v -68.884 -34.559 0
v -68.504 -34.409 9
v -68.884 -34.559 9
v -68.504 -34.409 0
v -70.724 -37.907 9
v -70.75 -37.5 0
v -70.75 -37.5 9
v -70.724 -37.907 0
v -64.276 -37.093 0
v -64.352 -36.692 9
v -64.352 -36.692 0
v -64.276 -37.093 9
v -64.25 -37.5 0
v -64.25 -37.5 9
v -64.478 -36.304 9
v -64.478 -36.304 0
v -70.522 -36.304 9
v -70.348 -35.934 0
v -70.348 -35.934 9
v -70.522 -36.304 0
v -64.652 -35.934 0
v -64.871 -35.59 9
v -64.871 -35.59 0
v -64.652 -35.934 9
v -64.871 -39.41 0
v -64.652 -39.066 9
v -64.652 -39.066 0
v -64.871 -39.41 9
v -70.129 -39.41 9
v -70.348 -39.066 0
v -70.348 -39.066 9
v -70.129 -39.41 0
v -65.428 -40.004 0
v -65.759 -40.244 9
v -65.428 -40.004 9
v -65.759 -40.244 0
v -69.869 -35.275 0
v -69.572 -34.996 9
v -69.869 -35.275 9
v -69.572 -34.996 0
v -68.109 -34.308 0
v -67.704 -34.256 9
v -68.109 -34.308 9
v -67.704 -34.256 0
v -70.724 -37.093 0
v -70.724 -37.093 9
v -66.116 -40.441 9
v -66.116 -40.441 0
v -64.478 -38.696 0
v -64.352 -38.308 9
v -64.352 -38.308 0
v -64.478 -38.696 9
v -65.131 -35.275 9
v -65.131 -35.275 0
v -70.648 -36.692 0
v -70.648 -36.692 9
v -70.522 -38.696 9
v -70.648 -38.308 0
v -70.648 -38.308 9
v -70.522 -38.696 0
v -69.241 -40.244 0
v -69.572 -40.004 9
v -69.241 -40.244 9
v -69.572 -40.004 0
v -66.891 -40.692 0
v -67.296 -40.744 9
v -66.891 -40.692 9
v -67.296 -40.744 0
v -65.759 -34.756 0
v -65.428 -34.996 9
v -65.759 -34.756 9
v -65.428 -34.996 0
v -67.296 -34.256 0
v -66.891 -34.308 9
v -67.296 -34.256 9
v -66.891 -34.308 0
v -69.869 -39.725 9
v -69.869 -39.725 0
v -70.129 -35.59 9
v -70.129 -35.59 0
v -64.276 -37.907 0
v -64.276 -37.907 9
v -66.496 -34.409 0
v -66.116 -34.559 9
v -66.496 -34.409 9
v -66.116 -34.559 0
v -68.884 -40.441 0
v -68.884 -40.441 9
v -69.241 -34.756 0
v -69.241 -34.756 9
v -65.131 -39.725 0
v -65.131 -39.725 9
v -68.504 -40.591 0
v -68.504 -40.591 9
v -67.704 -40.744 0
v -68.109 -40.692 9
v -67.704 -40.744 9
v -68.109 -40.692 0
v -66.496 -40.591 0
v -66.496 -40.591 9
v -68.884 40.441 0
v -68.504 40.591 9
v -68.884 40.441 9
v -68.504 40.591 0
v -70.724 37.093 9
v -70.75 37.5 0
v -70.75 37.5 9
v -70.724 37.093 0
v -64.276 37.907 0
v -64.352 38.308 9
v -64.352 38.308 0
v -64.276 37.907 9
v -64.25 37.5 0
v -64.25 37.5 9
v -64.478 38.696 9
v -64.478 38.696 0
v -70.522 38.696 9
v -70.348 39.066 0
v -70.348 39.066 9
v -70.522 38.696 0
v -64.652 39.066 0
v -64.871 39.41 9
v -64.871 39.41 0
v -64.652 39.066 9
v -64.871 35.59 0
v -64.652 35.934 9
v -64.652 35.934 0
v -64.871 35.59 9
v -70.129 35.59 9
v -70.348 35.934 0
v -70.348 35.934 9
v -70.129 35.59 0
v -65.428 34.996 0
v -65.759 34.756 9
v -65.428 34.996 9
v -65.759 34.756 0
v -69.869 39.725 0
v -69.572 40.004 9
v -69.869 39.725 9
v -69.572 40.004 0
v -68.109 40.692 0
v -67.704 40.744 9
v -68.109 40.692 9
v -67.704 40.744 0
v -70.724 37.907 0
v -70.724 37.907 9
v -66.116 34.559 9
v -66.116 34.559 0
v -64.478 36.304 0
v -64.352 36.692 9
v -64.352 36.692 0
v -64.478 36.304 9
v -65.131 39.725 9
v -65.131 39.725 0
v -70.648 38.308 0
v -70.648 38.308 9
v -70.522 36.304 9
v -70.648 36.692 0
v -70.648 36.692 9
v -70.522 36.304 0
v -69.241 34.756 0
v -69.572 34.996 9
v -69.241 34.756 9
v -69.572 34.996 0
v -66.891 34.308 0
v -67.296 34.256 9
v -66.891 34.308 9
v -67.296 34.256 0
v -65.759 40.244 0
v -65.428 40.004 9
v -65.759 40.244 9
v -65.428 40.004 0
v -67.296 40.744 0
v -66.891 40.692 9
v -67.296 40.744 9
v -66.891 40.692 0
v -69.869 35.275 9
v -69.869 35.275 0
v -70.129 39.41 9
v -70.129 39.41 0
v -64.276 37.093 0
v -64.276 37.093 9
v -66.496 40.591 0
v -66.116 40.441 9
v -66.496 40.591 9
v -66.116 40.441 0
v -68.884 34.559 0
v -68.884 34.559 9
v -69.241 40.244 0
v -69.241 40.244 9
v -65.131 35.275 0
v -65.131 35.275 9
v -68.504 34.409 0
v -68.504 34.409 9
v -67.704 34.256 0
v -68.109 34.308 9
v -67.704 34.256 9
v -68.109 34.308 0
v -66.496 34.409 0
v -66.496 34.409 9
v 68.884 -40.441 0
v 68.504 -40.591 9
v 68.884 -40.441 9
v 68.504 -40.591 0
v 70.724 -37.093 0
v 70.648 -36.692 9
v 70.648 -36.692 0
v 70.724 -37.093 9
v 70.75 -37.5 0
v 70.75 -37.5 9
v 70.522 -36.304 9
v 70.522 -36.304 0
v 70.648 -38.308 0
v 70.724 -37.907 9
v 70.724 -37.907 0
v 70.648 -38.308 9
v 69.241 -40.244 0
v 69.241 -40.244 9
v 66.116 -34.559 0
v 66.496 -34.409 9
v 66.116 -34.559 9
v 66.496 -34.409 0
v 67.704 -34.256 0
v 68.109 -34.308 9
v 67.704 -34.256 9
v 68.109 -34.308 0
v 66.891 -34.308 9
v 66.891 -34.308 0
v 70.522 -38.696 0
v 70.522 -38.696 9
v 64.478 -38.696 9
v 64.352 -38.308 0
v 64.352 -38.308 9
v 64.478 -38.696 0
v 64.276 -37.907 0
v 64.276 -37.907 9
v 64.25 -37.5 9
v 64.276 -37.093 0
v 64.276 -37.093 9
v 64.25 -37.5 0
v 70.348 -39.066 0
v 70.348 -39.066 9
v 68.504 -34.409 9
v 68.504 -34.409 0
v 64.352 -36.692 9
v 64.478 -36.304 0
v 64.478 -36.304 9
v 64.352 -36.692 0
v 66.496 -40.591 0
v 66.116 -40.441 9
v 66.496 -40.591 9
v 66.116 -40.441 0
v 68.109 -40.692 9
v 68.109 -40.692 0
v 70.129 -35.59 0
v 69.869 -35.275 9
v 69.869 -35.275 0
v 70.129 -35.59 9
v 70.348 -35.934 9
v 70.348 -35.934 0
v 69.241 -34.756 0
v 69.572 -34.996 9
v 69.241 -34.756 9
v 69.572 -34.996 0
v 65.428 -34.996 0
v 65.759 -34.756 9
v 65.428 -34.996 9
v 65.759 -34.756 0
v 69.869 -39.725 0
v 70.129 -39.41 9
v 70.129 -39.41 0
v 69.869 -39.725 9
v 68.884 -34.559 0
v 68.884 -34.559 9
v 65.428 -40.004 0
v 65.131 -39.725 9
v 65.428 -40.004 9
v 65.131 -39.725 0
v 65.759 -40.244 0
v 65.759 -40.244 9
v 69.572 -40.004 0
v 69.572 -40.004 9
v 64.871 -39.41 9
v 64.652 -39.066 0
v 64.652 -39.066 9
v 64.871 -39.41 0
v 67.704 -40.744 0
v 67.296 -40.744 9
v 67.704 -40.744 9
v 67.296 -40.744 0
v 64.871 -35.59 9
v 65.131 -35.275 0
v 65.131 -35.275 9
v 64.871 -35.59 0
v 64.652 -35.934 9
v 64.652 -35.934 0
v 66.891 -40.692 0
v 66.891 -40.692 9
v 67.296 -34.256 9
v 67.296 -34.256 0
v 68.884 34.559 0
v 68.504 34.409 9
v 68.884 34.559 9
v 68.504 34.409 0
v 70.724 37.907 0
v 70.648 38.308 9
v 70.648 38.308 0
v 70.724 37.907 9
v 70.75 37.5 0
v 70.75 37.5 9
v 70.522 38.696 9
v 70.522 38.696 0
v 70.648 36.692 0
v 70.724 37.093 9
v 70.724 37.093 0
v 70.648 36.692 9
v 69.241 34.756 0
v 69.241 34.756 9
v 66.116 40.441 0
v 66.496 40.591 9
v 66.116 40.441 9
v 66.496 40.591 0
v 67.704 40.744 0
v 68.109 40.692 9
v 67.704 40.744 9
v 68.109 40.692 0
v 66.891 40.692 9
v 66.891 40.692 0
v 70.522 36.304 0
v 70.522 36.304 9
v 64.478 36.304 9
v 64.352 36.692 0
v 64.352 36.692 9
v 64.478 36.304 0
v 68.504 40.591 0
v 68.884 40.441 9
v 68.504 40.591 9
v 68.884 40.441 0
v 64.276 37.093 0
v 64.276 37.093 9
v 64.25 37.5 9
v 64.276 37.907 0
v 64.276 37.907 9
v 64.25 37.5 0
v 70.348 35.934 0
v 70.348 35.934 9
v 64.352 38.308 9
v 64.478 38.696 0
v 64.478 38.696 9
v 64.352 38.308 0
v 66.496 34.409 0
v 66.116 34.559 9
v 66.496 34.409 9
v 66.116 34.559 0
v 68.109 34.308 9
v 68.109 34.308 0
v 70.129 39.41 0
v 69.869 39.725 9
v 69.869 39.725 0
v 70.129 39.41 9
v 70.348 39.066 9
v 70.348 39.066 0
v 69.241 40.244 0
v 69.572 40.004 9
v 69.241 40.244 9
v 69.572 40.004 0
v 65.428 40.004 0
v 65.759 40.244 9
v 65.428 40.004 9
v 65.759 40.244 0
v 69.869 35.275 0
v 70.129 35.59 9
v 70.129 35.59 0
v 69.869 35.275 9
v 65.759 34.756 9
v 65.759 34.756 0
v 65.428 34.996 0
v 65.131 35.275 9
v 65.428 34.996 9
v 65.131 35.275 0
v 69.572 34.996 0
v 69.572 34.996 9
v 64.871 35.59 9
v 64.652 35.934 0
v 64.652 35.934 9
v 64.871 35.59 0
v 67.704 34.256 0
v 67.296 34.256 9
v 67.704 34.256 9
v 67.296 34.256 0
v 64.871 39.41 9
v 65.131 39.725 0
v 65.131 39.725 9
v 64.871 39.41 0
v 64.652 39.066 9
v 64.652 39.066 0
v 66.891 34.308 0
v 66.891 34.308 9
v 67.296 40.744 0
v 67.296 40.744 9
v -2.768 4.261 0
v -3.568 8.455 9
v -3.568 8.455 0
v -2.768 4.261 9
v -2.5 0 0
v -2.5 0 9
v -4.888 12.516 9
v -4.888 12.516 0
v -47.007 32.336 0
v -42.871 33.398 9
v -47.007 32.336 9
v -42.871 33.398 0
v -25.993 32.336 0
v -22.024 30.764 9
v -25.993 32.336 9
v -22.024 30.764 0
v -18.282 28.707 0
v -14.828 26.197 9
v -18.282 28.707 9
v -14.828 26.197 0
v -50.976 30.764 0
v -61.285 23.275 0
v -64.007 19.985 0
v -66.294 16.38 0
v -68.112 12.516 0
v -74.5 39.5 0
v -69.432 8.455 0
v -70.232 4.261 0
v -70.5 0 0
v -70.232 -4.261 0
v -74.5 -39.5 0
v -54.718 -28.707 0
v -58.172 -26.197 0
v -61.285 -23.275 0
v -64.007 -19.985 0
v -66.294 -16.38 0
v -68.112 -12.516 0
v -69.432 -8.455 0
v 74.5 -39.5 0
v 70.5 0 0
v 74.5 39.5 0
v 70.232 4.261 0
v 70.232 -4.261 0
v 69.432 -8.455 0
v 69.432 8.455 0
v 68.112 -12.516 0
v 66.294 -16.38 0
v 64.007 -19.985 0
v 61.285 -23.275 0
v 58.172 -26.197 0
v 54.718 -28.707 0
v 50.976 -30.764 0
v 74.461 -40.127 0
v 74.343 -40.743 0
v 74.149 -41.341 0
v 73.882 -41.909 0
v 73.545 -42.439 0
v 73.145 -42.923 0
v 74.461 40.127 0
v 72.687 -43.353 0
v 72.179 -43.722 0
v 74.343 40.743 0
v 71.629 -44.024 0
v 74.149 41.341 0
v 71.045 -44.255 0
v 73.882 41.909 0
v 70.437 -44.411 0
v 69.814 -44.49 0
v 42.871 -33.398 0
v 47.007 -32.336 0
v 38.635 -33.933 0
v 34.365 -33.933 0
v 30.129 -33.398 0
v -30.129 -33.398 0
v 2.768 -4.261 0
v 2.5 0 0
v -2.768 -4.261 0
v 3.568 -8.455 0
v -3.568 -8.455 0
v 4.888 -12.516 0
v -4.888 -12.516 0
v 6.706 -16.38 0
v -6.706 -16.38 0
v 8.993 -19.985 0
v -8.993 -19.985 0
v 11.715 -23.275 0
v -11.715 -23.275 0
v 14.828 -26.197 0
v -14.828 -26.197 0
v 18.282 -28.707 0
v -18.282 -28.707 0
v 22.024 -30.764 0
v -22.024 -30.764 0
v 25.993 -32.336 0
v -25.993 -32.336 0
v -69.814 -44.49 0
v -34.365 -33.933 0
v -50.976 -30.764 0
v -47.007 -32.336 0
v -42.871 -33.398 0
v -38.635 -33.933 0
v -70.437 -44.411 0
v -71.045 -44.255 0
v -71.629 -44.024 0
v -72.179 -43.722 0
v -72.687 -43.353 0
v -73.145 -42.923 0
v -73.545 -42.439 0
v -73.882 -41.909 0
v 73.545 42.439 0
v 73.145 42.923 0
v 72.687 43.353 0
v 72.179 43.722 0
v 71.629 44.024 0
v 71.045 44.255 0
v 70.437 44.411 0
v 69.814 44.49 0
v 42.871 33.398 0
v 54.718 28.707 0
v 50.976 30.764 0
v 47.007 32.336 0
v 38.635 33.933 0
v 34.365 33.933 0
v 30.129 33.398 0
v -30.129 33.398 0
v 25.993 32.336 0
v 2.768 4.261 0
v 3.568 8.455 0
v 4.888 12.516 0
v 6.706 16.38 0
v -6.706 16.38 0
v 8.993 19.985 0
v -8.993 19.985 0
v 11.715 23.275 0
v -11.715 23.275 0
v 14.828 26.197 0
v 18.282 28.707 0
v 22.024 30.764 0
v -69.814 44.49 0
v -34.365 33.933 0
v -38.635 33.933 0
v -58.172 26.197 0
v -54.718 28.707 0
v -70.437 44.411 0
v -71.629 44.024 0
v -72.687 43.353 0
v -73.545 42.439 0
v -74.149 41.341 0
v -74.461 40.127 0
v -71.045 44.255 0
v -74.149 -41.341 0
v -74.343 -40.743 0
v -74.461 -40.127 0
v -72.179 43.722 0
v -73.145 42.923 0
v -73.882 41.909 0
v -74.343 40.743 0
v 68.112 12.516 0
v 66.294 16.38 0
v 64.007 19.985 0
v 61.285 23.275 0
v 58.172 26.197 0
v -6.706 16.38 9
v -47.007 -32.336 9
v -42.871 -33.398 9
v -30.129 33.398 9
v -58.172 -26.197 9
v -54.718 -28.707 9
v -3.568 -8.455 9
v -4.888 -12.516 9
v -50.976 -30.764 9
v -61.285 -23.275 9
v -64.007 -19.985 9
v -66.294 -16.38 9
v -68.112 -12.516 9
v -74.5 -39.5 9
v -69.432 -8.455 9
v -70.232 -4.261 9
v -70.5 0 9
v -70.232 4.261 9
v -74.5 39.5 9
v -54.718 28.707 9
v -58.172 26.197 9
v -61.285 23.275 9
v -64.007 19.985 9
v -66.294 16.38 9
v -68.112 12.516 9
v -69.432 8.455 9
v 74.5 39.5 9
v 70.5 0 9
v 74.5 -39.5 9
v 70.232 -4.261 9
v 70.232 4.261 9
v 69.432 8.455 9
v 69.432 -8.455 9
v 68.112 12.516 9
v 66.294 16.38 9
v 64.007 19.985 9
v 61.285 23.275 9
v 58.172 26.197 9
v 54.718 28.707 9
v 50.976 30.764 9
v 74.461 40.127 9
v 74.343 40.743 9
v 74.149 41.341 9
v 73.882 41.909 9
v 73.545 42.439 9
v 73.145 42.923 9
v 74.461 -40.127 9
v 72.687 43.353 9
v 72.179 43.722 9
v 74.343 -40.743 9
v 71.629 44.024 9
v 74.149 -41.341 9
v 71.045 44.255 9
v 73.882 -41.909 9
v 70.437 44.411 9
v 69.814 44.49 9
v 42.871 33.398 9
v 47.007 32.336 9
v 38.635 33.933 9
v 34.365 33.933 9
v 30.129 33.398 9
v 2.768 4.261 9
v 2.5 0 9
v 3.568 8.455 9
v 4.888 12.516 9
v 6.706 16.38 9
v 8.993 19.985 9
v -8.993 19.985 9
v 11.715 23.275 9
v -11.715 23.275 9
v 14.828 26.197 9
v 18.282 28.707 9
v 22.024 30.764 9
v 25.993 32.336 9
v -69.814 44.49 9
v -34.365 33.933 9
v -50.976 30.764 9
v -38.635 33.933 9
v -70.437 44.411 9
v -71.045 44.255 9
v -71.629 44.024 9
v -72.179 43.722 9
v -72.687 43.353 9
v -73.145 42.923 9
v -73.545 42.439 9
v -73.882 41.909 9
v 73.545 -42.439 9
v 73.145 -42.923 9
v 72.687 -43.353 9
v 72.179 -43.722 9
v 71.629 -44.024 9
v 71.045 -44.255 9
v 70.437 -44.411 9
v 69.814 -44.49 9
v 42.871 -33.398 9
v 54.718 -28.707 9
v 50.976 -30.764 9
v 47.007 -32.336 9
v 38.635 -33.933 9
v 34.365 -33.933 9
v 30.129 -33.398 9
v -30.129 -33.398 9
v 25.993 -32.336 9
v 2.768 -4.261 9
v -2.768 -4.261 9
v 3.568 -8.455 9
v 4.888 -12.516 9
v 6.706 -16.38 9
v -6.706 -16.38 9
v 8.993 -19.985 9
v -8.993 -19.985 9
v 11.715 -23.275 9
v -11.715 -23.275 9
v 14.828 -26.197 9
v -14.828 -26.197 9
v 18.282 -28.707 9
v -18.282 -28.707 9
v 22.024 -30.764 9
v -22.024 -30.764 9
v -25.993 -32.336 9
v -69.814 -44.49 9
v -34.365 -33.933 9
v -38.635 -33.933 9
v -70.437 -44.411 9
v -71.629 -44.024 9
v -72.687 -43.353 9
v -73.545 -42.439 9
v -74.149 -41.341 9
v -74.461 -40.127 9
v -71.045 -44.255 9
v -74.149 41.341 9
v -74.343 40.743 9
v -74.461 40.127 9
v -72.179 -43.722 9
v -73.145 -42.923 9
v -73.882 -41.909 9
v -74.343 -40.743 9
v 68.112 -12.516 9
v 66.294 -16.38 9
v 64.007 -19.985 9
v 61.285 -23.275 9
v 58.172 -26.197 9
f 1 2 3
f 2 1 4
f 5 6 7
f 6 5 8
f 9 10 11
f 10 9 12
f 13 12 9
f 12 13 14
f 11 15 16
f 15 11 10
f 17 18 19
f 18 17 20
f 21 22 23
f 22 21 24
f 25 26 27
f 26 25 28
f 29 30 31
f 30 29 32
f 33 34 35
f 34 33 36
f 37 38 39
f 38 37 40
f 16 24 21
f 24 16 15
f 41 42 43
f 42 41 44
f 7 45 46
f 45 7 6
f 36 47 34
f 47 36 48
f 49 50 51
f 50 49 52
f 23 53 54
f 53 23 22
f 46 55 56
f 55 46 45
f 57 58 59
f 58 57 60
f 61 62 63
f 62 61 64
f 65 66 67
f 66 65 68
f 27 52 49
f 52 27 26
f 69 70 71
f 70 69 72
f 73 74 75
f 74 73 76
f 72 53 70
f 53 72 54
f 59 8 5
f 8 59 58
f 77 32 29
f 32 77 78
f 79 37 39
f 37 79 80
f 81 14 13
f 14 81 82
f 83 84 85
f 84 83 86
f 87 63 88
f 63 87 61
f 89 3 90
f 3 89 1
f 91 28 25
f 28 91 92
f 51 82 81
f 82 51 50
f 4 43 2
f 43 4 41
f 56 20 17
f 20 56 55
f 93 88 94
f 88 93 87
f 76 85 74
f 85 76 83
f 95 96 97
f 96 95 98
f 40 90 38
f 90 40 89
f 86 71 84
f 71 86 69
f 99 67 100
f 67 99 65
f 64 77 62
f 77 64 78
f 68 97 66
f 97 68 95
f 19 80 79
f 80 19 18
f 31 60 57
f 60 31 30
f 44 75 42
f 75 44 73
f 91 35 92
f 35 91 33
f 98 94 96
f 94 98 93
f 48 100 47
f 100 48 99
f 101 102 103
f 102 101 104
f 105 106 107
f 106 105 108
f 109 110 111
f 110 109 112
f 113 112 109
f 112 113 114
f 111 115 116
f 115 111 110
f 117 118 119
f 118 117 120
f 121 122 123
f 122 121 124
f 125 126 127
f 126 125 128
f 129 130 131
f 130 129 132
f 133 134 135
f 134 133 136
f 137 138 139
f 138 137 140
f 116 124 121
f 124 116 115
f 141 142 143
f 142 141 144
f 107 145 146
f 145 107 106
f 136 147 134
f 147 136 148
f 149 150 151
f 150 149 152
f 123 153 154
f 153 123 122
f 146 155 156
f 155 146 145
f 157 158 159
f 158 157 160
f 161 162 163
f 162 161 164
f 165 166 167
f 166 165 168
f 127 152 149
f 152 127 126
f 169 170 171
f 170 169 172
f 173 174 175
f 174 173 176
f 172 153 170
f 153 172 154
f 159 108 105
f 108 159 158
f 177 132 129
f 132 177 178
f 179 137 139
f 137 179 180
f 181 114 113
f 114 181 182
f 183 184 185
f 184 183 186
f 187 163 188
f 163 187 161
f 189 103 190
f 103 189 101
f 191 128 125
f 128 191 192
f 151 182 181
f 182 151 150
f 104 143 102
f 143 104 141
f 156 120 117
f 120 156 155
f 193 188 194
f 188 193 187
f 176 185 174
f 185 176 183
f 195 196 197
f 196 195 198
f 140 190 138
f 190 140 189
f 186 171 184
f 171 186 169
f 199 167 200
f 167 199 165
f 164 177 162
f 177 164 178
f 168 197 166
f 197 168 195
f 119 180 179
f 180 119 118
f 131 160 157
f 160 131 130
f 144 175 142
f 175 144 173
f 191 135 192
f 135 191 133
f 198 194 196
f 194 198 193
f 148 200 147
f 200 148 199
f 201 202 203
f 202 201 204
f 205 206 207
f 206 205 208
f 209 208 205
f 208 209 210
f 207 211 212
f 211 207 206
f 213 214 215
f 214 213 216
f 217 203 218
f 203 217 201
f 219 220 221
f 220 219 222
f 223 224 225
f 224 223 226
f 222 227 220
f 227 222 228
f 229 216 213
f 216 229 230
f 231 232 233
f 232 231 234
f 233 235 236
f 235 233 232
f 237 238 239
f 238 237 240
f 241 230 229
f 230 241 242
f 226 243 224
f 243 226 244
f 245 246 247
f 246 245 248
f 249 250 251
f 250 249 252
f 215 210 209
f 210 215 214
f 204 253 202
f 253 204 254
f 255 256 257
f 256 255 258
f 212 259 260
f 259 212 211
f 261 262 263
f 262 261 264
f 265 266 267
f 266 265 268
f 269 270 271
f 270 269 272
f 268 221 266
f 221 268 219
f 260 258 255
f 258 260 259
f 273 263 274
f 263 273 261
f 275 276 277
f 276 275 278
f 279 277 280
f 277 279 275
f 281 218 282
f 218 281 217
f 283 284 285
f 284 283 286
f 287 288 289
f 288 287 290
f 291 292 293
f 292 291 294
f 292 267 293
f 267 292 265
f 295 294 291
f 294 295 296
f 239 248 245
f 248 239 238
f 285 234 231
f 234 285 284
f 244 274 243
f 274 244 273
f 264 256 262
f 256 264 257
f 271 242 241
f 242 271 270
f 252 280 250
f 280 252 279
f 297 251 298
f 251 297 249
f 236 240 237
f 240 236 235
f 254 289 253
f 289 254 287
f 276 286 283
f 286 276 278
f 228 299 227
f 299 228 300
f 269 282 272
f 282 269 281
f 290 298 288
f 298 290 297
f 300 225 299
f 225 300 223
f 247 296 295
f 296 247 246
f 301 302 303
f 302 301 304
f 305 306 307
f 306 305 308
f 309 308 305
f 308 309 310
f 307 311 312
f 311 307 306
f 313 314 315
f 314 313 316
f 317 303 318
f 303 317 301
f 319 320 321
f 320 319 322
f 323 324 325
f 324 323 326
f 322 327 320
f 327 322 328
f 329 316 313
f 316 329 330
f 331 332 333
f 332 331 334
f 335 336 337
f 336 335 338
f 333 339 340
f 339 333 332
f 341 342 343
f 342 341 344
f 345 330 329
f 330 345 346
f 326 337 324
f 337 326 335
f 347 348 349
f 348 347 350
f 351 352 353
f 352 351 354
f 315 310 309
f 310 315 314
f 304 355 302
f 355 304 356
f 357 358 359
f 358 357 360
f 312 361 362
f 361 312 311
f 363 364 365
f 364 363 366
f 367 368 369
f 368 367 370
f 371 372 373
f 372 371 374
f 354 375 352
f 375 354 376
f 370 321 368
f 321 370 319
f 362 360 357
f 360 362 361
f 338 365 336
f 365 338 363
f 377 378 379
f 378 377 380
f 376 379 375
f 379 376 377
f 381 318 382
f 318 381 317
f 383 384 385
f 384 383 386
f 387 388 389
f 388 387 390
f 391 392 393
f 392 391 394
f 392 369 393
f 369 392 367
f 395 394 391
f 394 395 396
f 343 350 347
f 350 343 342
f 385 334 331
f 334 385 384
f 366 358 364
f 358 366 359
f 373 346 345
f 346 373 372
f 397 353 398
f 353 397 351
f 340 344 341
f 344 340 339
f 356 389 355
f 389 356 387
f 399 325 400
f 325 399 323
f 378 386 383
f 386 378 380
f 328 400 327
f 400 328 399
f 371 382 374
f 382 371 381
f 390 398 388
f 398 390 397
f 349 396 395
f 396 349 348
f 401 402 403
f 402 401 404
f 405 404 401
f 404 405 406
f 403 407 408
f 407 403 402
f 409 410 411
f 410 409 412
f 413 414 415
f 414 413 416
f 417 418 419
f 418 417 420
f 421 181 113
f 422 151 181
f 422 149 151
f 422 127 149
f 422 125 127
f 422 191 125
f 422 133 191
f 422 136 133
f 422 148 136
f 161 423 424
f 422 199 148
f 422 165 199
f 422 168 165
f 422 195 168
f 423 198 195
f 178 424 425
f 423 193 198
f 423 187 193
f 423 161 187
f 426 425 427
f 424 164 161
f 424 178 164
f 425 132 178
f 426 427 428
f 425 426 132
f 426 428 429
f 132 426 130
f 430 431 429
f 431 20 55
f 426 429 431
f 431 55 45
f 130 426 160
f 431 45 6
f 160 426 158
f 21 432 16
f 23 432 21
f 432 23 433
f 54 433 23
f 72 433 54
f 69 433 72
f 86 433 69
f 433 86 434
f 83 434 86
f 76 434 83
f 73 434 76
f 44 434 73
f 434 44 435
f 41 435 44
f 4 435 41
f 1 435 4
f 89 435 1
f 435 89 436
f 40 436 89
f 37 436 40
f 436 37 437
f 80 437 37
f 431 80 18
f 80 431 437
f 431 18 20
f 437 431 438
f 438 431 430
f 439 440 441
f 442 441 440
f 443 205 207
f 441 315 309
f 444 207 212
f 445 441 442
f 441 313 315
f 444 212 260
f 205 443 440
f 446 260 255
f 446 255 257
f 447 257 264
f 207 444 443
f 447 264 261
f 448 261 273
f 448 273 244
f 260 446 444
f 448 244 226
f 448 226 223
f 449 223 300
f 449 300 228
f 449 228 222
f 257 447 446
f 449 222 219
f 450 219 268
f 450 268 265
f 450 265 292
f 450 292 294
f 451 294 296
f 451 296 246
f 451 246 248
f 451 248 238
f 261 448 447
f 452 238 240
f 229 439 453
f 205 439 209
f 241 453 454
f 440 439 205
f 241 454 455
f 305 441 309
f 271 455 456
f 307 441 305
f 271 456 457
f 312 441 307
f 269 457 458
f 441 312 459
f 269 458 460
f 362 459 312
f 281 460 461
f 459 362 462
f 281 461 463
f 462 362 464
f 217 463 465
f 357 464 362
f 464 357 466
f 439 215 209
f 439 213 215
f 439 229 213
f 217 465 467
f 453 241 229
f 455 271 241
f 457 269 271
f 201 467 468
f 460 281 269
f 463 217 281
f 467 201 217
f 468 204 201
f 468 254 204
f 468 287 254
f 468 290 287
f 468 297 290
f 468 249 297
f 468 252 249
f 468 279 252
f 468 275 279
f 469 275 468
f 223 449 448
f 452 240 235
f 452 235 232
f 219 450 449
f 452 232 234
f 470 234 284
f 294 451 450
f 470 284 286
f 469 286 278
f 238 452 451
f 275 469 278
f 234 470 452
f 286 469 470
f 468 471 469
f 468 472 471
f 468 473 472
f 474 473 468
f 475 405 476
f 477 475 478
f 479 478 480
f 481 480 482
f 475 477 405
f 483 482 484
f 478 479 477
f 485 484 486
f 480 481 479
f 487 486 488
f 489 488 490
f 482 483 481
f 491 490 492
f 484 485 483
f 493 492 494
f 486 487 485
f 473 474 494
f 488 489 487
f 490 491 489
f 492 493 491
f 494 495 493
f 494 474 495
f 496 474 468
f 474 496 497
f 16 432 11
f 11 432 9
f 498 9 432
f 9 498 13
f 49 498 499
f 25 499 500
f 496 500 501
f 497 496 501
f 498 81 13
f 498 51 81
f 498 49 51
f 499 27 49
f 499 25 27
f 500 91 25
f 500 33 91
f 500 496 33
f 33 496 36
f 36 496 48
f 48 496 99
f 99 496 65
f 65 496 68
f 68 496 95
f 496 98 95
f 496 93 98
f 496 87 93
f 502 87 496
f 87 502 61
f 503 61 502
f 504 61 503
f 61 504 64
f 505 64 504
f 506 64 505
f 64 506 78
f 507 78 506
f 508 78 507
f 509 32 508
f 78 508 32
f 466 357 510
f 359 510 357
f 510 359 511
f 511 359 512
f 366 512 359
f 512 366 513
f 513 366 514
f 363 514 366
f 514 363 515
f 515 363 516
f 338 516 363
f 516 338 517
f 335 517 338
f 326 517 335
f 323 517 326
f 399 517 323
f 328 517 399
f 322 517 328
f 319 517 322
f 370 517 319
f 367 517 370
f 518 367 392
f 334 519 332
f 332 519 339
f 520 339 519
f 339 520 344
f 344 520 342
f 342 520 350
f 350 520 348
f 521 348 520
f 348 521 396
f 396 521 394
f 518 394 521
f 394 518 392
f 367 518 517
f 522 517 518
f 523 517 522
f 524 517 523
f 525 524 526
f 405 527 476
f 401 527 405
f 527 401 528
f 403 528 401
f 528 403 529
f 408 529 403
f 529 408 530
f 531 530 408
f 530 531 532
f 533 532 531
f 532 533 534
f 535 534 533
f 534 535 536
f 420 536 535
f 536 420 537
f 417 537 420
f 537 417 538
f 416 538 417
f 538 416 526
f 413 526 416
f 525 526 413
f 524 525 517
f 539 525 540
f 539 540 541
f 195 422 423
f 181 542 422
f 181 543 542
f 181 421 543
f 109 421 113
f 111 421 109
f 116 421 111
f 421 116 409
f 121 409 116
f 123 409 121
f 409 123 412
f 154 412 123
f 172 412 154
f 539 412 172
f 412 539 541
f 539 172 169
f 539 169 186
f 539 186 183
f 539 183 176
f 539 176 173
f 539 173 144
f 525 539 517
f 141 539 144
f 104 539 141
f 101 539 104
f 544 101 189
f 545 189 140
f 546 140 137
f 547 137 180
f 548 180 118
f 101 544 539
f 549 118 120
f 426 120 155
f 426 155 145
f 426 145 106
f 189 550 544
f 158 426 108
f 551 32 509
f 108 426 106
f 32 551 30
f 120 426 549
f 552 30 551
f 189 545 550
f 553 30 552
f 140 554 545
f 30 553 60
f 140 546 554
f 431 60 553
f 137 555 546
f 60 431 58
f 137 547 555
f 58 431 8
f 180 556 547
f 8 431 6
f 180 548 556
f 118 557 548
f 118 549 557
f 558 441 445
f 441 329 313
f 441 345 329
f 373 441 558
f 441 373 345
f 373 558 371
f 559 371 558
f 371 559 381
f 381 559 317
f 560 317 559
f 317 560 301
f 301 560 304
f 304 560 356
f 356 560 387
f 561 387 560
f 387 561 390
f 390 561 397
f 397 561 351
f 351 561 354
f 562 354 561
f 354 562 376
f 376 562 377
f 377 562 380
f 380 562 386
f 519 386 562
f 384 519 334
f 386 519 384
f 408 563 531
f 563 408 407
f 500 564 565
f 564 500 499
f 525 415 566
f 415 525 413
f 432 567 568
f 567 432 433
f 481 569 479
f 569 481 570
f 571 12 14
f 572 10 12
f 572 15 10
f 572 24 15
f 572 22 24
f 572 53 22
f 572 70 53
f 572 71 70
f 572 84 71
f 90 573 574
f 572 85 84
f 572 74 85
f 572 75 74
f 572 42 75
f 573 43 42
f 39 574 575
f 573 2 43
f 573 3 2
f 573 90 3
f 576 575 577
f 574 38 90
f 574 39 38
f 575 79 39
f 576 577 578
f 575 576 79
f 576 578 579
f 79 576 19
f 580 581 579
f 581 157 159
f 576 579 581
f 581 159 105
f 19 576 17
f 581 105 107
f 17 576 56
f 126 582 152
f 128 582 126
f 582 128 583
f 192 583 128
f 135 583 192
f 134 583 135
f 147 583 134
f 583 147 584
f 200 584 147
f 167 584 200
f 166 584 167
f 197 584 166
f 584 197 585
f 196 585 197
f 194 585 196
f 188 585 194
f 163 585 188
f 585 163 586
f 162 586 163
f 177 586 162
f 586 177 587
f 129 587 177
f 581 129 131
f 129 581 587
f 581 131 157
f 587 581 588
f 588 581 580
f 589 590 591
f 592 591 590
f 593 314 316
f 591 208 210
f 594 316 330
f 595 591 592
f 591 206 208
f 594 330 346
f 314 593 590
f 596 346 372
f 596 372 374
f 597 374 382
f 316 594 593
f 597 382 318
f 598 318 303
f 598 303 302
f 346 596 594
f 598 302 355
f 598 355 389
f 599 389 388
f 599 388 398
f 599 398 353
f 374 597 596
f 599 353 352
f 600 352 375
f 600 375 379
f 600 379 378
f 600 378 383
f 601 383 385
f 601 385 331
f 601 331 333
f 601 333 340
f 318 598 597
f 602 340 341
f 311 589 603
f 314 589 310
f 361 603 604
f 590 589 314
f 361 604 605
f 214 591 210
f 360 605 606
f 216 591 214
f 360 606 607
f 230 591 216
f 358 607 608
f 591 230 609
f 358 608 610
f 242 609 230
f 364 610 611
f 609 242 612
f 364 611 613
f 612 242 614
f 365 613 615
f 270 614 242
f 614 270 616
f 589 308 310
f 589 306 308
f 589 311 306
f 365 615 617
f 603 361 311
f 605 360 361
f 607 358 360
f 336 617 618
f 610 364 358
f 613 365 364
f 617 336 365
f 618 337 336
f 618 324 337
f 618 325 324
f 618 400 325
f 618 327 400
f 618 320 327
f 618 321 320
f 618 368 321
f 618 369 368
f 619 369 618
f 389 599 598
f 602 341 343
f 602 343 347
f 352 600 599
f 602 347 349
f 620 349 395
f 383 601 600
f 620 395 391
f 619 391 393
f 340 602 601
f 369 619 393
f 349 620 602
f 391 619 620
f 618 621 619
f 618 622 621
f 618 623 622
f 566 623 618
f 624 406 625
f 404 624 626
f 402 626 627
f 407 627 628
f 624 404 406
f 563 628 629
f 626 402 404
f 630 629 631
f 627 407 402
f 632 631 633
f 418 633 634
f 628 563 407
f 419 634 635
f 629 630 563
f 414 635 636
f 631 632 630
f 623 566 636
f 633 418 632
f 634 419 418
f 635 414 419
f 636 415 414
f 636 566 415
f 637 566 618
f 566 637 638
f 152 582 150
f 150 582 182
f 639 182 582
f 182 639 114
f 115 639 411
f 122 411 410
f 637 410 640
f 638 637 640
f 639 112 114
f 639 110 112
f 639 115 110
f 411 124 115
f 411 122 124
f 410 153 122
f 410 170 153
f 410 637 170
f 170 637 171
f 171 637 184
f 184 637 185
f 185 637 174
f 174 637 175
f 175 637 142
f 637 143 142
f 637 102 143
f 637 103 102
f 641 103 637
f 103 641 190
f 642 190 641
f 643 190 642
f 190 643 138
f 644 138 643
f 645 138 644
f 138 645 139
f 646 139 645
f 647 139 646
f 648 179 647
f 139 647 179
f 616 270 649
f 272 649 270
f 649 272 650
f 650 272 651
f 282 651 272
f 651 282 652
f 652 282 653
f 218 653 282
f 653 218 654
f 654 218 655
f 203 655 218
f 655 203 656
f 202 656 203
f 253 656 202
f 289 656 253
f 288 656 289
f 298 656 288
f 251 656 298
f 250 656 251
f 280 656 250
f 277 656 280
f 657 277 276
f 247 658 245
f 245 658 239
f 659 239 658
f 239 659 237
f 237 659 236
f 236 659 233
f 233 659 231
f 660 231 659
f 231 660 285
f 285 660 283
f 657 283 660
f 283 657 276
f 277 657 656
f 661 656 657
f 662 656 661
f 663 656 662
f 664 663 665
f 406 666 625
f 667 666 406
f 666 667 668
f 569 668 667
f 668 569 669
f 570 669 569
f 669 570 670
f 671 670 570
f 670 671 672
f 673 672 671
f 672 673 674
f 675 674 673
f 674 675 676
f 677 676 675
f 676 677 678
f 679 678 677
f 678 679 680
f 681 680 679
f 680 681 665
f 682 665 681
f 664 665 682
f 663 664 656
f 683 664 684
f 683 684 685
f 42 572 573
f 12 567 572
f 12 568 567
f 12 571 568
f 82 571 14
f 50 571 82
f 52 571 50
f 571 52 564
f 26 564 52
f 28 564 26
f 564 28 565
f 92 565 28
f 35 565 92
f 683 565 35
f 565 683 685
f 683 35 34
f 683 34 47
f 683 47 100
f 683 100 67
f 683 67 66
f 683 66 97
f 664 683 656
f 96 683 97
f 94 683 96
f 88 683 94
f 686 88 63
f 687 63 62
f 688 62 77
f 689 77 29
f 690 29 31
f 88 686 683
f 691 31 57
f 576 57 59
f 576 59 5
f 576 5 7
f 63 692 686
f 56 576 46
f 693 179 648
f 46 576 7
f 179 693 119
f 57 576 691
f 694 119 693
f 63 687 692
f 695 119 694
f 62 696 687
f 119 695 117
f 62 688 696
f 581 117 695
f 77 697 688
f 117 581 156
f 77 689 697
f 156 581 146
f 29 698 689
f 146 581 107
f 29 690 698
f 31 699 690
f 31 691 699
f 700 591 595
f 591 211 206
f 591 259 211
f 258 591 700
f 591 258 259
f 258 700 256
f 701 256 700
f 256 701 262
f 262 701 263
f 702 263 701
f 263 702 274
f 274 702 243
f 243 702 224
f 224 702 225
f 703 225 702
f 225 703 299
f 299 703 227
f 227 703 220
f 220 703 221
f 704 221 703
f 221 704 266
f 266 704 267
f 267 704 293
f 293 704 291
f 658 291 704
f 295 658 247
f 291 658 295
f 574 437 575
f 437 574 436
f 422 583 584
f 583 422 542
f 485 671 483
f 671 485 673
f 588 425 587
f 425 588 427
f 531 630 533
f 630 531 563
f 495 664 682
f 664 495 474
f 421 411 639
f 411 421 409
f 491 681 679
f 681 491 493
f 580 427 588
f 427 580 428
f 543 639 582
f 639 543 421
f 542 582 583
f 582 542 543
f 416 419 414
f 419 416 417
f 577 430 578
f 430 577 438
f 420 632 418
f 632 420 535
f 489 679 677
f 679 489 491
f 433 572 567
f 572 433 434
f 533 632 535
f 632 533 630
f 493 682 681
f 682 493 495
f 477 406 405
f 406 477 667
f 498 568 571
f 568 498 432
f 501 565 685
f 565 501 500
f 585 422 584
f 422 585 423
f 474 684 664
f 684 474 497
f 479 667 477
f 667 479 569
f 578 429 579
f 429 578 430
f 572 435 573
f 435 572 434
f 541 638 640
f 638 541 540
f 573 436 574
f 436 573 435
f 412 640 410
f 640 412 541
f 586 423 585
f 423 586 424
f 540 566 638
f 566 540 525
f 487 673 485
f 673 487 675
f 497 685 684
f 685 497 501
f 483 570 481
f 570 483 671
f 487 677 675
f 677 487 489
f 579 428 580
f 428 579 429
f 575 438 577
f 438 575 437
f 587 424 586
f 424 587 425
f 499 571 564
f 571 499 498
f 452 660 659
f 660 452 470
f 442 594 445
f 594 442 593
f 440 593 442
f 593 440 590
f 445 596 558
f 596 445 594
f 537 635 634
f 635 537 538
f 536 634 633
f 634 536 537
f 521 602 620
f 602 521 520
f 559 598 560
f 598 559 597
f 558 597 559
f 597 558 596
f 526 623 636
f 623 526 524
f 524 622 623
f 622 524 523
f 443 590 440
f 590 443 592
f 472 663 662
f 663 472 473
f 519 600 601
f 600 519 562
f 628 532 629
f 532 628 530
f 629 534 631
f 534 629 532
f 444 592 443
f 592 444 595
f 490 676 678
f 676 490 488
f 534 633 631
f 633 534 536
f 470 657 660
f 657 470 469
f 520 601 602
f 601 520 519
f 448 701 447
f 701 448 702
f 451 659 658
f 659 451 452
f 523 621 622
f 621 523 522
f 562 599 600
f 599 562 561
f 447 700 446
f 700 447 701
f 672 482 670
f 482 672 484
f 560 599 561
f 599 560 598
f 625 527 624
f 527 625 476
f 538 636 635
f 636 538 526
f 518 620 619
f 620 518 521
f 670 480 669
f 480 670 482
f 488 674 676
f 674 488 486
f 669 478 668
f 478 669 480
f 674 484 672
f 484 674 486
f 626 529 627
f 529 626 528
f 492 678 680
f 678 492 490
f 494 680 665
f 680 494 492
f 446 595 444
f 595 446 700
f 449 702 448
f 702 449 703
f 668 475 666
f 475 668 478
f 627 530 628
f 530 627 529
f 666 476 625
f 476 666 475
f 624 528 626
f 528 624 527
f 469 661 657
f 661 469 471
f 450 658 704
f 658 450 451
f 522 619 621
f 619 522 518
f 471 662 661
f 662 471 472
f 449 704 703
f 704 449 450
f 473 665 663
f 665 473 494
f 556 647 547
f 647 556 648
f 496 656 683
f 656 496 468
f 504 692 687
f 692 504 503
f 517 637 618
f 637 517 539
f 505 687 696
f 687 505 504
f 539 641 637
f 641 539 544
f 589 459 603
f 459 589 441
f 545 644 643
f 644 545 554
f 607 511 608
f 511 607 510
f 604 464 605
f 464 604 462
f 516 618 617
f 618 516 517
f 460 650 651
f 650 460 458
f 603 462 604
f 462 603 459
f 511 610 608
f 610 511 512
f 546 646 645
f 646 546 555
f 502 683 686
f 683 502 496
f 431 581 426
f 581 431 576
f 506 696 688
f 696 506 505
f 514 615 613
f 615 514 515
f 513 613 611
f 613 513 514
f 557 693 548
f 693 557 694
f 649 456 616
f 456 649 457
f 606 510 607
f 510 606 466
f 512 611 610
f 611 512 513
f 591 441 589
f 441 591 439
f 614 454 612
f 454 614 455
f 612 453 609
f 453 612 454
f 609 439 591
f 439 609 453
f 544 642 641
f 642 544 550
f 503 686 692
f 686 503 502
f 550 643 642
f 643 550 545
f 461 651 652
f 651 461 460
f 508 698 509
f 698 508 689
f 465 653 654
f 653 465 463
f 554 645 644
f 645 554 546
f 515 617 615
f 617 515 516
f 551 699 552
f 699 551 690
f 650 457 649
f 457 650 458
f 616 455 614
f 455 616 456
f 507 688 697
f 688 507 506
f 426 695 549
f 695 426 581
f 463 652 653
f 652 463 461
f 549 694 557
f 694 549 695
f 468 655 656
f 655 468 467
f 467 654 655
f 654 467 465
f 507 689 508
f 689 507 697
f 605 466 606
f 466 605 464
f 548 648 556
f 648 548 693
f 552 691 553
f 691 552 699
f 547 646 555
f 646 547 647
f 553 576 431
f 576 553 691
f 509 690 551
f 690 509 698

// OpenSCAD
$fn = 50;


difference() {
	union() {
		hull() {
			translate(v = [-69.5000000000, 39.5000000000, 0]) {
				cylinder(h = 9, r = 5);
			}
			translate(v = [69.5000000000, 39.5000000000, 0]) {
				cylinder(h = 9, r = 5);
			}
			translate(v = [-69.5000000000, -39.5000000000, 0]) {
				cylinder(h = 9, r = 5);
			}
			translate(v = [69.5000000000, -39.5000000000, 0]) {
				cylinder(h = 9, r = 5);
			}
		}
	}
	union() {
		#translate(v = [-67.5000000000, -37.5000000000, -100.0000000000]) {
			cylinder(h = 200, r = 3.2500000000);
		}
		#translate(v = [-67.5000000000, 37.5000000000, -100.0000000000]) {
			cylinder(h = 200, r = 3.2500000000);
		}
		#translate(v = [67.5000000000, -37.5000000000, -100.0000000000]) {
			cylinder(h = 200, r = 3.2500000000);
		}
		#translate(v = [67.5000000000, 37.5000000000, -100.0000000000]) {
			cylinder(h = 200, r = 3.2500000000);
		}
		#translate(v = [-36.5000000000, 0, 0]) {
			cylinder(h = 9, r = 34.0000000000);
		}
		#translate(v = [36.5000000000, 0, 0]) {
			cylinder(h = 9, r = 34.0000000000);
		}
	}
}
